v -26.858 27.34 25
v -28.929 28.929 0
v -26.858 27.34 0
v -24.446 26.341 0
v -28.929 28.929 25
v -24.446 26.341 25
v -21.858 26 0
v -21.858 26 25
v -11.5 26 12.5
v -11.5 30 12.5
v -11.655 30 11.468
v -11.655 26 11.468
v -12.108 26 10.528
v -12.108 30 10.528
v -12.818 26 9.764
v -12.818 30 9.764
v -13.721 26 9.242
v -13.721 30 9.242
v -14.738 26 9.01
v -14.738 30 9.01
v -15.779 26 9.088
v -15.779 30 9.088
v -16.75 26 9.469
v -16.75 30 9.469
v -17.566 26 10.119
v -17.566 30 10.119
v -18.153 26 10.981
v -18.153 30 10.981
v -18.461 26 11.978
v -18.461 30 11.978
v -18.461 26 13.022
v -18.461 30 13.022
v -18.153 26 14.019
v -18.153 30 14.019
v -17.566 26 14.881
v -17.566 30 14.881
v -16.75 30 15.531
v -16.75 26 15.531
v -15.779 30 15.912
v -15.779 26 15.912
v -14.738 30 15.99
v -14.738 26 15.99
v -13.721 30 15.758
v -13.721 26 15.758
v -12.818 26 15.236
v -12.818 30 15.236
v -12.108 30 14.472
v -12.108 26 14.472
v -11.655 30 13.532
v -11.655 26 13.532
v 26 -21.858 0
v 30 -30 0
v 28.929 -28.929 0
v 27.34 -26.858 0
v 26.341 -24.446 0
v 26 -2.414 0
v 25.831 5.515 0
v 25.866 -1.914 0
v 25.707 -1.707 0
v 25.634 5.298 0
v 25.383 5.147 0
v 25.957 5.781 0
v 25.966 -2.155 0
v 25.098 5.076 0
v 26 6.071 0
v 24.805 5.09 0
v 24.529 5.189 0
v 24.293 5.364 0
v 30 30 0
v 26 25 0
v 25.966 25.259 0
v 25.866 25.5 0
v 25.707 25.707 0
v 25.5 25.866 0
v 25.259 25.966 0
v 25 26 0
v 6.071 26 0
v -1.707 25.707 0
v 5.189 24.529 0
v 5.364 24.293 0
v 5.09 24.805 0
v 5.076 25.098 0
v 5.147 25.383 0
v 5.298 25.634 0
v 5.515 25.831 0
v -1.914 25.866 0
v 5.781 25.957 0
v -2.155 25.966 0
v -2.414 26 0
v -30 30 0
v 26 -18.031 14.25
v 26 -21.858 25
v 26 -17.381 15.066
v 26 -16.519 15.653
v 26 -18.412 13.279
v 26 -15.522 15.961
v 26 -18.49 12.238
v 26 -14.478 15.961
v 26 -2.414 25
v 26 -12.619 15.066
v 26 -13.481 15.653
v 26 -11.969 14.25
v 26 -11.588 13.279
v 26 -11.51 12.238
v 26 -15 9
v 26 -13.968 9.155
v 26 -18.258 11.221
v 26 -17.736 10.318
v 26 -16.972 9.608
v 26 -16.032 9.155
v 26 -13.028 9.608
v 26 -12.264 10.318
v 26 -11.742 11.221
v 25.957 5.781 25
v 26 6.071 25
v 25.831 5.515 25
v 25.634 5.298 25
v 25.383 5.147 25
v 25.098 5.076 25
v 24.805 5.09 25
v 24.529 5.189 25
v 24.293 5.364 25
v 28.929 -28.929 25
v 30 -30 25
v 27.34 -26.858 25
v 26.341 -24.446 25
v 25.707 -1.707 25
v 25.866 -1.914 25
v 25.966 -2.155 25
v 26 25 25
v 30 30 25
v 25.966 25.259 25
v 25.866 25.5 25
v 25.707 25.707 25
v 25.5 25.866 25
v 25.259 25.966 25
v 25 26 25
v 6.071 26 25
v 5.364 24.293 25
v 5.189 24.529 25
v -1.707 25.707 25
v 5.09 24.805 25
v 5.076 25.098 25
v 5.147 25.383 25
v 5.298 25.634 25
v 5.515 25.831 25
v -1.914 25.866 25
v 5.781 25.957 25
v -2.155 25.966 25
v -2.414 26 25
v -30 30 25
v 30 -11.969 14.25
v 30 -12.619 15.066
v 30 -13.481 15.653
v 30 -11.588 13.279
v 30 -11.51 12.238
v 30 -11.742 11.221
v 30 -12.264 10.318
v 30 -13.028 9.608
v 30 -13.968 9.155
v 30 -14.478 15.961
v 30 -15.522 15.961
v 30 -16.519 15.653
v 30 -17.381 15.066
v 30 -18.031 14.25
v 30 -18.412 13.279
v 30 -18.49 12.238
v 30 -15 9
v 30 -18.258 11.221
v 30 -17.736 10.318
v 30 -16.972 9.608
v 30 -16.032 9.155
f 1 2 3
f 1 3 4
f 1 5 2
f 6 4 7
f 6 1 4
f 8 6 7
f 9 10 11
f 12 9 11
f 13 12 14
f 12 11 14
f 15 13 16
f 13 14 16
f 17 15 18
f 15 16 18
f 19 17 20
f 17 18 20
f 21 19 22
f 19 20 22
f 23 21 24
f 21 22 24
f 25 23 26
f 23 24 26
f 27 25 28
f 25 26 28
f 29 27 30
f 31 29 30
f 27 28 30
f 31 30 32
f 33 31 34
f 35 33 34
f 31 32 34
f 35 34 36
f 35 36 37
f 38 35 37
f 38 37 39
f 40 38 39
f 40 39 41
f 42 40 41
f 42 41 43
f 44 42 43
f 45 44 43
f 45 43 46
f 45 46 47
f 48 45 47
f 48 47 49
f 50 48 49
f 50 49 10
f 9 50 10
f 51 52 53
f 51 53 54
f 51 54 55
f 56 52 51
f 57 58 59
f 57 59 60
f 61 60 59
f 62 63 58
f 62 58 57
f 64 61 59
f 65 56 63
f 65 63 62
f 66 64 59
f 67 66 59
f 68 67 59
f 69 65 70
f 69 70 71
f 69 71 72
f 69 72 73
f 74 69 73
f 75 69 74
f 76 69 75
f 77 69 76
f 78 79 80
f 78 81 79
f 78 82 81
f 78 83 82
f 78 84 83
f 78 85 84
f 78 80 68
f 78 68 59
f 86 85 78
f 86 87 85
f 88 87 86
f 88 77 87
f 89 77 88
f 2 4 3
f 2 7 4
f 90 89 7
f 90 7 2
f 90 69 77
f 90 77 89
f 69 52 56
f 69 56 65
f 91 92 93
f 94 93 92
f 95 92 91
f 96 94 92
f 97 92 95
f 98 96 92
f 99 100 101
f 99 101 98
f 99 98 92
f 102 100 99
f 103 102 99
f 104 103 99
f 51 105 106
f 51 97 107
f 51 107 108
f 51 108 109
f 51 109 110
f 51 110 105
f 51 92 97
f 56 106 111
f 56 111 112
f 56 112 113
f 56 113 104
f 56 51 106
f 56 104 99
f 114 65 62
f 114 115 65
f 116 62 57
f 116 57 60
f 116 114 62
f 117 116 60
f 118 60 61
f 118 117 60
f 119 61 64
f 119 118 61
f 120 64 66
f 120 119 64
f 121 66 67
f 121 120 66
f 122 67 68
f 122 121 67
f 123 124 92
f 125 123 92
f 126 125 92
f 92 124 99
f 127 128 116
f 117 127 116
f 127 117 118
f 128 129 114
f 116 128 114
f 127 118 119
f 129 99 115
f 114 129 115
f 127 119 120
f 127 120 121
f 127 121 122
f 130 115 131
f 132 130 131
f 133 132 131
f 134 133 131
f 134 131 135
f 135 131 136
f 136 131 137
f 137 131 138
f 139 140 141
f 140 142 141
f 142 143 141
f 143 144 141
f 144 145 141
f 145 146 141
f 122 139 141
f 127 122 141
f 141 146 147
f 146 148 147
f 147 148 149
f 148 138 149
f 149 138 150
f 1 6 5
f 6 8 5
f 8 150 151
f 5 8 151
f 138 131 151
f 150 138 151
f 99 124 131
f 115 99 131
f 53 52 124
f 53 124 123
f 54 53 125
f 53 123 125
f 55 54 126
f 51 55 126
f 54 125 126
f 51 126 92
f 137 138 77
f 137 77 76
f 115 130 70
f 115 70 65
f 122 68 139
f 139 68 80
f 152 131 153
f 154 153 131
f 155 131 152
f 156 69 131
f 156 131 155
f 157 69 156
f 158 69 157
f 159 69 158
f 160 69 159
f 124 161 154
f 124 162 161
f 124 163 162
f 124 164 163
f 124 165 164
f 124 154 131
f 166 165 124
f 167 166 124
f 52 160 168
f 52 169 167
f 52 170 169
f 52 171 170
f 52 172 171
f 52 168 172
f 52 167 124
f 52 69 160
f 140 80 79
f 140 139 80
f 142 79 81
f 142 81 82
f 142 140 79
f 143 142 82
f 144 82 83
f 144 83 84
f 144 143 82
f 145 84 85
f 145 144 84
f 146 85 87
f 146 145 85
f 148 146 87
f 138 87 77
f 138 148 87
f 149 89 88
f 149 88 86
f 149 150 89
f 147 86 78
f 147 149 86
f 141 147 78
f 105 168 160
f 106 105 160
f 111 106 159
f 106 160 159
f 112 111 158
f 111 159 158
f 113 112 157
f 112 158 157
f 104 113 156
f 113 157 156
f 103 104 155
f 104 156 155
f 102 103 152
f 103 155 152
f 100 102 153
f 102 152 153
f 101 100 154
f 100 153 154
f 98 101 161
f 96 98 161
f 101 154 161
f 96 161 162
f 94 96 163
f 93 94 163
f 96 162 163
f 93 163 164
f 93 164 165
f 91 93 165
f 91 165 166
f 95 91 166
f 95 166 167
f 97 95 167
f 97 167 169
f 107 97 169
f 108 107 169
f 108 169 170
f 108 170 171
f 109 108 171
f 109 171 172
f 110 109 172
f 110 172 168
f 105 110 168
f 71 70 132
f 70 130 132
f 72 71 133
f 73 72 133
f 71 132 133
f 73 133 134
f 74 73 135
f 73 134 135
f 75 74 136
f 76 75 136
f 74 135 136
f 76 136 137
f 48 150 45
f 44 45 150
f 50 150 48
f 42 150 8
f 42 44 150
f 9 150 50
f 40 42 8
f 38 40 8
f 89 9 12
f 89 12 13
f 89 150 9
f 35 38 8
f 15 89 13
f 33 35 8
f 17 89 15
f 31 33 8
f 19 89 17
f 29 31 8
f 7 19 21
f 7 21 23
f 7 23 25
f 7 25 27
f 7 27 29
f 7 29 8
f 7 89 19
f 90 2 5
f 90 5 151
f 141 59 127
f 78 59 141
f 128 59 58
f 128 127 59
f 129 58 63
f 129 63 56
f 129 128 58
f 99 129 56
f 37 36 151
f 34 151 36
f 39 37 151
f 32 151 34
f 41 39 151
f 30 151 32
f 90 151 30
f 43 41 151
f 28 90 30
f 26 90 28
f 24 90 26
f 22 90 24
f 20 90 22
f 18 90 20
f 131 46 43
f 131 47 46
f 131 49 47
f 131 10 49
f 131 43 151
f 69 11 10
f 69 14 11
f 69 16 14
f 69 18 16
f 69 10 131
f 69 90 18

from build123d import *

# Parameters (mm, degrees)
EXTRUDE_1_DEPTH     = 25
FILLET_1_R          = 10
FILLET_2_R          = 1
SKETCH_2_R          = 3.5
CUT_EXTRUDE_2_DEPTH = 25
SKETCH_4_R          = 3.5
CUT_EXTRUDE_3_DEPTH = 25


with BuildPart() as part:
    # 스케치1 → 보스-돌출1 (new body)
    with BuildSketch(Plane.XY):
        Polygon((-30, 30), (30, 30), (30, -30), (26, -26), (26, -2), (-2, 26), (-26, 26), align=None)
        Polygon((26, 26), (26, 3.656854249), (3.656854249, 26), align=None, mode=Mode.SUBTRACT)
    extrude(amount=EXTRUDE_1_DEPTH)

    # 필렛1
    fillet_1_edges = [part.edges().sort_by_distance(p)[0] for p in [
        (26, -26, 12.5),
        (-26, 26, 12.5),
    ]]
    fillet(fillet_1_edges, radius=FILLET_1_R)

    # 필렛2
    fillet_2_edges = [part.edges().sort_by_distance(p)[0] for p in [
        (26, -2, 12.5),
        (-2, 26, 12.5),
        (26, 26, 12.5),
        (3.656854249, 26, 12.5),
        (26, 3.656854249, 12.5),
    ]]
    fillet(fillet_2_edges, radius=FILLET_2_R)

    # 스케치2 → 컷-돌출2 (cut)
    with BuildSketch(Plane(origin=(0, 30, 0), x_dir=(1, 0, 0), z_dir=(0, 1, 0))):
        with Locations((-15, -12.5)):
            Circle(SKETCH_2_R)
    extrude(amount=-CUT_EXTRUDE_2_DEPTH, mode=Mode.SUBTRACT)

    # 스케치4 → 컷-돌출3 (cut)
    with BuildSketch(Plane(origin=(30, 0, 0), x_dir=(0, 0, -1), z_dir=(1, 0, 0))):
        with Locations((-12.5, -15)):
            Circle(SKETCH_4_R)
    extrude(amount=-CUT_EXTRUDE_3_DEPTH, mode=Mode.SUBTRACT)


solid = part.part
